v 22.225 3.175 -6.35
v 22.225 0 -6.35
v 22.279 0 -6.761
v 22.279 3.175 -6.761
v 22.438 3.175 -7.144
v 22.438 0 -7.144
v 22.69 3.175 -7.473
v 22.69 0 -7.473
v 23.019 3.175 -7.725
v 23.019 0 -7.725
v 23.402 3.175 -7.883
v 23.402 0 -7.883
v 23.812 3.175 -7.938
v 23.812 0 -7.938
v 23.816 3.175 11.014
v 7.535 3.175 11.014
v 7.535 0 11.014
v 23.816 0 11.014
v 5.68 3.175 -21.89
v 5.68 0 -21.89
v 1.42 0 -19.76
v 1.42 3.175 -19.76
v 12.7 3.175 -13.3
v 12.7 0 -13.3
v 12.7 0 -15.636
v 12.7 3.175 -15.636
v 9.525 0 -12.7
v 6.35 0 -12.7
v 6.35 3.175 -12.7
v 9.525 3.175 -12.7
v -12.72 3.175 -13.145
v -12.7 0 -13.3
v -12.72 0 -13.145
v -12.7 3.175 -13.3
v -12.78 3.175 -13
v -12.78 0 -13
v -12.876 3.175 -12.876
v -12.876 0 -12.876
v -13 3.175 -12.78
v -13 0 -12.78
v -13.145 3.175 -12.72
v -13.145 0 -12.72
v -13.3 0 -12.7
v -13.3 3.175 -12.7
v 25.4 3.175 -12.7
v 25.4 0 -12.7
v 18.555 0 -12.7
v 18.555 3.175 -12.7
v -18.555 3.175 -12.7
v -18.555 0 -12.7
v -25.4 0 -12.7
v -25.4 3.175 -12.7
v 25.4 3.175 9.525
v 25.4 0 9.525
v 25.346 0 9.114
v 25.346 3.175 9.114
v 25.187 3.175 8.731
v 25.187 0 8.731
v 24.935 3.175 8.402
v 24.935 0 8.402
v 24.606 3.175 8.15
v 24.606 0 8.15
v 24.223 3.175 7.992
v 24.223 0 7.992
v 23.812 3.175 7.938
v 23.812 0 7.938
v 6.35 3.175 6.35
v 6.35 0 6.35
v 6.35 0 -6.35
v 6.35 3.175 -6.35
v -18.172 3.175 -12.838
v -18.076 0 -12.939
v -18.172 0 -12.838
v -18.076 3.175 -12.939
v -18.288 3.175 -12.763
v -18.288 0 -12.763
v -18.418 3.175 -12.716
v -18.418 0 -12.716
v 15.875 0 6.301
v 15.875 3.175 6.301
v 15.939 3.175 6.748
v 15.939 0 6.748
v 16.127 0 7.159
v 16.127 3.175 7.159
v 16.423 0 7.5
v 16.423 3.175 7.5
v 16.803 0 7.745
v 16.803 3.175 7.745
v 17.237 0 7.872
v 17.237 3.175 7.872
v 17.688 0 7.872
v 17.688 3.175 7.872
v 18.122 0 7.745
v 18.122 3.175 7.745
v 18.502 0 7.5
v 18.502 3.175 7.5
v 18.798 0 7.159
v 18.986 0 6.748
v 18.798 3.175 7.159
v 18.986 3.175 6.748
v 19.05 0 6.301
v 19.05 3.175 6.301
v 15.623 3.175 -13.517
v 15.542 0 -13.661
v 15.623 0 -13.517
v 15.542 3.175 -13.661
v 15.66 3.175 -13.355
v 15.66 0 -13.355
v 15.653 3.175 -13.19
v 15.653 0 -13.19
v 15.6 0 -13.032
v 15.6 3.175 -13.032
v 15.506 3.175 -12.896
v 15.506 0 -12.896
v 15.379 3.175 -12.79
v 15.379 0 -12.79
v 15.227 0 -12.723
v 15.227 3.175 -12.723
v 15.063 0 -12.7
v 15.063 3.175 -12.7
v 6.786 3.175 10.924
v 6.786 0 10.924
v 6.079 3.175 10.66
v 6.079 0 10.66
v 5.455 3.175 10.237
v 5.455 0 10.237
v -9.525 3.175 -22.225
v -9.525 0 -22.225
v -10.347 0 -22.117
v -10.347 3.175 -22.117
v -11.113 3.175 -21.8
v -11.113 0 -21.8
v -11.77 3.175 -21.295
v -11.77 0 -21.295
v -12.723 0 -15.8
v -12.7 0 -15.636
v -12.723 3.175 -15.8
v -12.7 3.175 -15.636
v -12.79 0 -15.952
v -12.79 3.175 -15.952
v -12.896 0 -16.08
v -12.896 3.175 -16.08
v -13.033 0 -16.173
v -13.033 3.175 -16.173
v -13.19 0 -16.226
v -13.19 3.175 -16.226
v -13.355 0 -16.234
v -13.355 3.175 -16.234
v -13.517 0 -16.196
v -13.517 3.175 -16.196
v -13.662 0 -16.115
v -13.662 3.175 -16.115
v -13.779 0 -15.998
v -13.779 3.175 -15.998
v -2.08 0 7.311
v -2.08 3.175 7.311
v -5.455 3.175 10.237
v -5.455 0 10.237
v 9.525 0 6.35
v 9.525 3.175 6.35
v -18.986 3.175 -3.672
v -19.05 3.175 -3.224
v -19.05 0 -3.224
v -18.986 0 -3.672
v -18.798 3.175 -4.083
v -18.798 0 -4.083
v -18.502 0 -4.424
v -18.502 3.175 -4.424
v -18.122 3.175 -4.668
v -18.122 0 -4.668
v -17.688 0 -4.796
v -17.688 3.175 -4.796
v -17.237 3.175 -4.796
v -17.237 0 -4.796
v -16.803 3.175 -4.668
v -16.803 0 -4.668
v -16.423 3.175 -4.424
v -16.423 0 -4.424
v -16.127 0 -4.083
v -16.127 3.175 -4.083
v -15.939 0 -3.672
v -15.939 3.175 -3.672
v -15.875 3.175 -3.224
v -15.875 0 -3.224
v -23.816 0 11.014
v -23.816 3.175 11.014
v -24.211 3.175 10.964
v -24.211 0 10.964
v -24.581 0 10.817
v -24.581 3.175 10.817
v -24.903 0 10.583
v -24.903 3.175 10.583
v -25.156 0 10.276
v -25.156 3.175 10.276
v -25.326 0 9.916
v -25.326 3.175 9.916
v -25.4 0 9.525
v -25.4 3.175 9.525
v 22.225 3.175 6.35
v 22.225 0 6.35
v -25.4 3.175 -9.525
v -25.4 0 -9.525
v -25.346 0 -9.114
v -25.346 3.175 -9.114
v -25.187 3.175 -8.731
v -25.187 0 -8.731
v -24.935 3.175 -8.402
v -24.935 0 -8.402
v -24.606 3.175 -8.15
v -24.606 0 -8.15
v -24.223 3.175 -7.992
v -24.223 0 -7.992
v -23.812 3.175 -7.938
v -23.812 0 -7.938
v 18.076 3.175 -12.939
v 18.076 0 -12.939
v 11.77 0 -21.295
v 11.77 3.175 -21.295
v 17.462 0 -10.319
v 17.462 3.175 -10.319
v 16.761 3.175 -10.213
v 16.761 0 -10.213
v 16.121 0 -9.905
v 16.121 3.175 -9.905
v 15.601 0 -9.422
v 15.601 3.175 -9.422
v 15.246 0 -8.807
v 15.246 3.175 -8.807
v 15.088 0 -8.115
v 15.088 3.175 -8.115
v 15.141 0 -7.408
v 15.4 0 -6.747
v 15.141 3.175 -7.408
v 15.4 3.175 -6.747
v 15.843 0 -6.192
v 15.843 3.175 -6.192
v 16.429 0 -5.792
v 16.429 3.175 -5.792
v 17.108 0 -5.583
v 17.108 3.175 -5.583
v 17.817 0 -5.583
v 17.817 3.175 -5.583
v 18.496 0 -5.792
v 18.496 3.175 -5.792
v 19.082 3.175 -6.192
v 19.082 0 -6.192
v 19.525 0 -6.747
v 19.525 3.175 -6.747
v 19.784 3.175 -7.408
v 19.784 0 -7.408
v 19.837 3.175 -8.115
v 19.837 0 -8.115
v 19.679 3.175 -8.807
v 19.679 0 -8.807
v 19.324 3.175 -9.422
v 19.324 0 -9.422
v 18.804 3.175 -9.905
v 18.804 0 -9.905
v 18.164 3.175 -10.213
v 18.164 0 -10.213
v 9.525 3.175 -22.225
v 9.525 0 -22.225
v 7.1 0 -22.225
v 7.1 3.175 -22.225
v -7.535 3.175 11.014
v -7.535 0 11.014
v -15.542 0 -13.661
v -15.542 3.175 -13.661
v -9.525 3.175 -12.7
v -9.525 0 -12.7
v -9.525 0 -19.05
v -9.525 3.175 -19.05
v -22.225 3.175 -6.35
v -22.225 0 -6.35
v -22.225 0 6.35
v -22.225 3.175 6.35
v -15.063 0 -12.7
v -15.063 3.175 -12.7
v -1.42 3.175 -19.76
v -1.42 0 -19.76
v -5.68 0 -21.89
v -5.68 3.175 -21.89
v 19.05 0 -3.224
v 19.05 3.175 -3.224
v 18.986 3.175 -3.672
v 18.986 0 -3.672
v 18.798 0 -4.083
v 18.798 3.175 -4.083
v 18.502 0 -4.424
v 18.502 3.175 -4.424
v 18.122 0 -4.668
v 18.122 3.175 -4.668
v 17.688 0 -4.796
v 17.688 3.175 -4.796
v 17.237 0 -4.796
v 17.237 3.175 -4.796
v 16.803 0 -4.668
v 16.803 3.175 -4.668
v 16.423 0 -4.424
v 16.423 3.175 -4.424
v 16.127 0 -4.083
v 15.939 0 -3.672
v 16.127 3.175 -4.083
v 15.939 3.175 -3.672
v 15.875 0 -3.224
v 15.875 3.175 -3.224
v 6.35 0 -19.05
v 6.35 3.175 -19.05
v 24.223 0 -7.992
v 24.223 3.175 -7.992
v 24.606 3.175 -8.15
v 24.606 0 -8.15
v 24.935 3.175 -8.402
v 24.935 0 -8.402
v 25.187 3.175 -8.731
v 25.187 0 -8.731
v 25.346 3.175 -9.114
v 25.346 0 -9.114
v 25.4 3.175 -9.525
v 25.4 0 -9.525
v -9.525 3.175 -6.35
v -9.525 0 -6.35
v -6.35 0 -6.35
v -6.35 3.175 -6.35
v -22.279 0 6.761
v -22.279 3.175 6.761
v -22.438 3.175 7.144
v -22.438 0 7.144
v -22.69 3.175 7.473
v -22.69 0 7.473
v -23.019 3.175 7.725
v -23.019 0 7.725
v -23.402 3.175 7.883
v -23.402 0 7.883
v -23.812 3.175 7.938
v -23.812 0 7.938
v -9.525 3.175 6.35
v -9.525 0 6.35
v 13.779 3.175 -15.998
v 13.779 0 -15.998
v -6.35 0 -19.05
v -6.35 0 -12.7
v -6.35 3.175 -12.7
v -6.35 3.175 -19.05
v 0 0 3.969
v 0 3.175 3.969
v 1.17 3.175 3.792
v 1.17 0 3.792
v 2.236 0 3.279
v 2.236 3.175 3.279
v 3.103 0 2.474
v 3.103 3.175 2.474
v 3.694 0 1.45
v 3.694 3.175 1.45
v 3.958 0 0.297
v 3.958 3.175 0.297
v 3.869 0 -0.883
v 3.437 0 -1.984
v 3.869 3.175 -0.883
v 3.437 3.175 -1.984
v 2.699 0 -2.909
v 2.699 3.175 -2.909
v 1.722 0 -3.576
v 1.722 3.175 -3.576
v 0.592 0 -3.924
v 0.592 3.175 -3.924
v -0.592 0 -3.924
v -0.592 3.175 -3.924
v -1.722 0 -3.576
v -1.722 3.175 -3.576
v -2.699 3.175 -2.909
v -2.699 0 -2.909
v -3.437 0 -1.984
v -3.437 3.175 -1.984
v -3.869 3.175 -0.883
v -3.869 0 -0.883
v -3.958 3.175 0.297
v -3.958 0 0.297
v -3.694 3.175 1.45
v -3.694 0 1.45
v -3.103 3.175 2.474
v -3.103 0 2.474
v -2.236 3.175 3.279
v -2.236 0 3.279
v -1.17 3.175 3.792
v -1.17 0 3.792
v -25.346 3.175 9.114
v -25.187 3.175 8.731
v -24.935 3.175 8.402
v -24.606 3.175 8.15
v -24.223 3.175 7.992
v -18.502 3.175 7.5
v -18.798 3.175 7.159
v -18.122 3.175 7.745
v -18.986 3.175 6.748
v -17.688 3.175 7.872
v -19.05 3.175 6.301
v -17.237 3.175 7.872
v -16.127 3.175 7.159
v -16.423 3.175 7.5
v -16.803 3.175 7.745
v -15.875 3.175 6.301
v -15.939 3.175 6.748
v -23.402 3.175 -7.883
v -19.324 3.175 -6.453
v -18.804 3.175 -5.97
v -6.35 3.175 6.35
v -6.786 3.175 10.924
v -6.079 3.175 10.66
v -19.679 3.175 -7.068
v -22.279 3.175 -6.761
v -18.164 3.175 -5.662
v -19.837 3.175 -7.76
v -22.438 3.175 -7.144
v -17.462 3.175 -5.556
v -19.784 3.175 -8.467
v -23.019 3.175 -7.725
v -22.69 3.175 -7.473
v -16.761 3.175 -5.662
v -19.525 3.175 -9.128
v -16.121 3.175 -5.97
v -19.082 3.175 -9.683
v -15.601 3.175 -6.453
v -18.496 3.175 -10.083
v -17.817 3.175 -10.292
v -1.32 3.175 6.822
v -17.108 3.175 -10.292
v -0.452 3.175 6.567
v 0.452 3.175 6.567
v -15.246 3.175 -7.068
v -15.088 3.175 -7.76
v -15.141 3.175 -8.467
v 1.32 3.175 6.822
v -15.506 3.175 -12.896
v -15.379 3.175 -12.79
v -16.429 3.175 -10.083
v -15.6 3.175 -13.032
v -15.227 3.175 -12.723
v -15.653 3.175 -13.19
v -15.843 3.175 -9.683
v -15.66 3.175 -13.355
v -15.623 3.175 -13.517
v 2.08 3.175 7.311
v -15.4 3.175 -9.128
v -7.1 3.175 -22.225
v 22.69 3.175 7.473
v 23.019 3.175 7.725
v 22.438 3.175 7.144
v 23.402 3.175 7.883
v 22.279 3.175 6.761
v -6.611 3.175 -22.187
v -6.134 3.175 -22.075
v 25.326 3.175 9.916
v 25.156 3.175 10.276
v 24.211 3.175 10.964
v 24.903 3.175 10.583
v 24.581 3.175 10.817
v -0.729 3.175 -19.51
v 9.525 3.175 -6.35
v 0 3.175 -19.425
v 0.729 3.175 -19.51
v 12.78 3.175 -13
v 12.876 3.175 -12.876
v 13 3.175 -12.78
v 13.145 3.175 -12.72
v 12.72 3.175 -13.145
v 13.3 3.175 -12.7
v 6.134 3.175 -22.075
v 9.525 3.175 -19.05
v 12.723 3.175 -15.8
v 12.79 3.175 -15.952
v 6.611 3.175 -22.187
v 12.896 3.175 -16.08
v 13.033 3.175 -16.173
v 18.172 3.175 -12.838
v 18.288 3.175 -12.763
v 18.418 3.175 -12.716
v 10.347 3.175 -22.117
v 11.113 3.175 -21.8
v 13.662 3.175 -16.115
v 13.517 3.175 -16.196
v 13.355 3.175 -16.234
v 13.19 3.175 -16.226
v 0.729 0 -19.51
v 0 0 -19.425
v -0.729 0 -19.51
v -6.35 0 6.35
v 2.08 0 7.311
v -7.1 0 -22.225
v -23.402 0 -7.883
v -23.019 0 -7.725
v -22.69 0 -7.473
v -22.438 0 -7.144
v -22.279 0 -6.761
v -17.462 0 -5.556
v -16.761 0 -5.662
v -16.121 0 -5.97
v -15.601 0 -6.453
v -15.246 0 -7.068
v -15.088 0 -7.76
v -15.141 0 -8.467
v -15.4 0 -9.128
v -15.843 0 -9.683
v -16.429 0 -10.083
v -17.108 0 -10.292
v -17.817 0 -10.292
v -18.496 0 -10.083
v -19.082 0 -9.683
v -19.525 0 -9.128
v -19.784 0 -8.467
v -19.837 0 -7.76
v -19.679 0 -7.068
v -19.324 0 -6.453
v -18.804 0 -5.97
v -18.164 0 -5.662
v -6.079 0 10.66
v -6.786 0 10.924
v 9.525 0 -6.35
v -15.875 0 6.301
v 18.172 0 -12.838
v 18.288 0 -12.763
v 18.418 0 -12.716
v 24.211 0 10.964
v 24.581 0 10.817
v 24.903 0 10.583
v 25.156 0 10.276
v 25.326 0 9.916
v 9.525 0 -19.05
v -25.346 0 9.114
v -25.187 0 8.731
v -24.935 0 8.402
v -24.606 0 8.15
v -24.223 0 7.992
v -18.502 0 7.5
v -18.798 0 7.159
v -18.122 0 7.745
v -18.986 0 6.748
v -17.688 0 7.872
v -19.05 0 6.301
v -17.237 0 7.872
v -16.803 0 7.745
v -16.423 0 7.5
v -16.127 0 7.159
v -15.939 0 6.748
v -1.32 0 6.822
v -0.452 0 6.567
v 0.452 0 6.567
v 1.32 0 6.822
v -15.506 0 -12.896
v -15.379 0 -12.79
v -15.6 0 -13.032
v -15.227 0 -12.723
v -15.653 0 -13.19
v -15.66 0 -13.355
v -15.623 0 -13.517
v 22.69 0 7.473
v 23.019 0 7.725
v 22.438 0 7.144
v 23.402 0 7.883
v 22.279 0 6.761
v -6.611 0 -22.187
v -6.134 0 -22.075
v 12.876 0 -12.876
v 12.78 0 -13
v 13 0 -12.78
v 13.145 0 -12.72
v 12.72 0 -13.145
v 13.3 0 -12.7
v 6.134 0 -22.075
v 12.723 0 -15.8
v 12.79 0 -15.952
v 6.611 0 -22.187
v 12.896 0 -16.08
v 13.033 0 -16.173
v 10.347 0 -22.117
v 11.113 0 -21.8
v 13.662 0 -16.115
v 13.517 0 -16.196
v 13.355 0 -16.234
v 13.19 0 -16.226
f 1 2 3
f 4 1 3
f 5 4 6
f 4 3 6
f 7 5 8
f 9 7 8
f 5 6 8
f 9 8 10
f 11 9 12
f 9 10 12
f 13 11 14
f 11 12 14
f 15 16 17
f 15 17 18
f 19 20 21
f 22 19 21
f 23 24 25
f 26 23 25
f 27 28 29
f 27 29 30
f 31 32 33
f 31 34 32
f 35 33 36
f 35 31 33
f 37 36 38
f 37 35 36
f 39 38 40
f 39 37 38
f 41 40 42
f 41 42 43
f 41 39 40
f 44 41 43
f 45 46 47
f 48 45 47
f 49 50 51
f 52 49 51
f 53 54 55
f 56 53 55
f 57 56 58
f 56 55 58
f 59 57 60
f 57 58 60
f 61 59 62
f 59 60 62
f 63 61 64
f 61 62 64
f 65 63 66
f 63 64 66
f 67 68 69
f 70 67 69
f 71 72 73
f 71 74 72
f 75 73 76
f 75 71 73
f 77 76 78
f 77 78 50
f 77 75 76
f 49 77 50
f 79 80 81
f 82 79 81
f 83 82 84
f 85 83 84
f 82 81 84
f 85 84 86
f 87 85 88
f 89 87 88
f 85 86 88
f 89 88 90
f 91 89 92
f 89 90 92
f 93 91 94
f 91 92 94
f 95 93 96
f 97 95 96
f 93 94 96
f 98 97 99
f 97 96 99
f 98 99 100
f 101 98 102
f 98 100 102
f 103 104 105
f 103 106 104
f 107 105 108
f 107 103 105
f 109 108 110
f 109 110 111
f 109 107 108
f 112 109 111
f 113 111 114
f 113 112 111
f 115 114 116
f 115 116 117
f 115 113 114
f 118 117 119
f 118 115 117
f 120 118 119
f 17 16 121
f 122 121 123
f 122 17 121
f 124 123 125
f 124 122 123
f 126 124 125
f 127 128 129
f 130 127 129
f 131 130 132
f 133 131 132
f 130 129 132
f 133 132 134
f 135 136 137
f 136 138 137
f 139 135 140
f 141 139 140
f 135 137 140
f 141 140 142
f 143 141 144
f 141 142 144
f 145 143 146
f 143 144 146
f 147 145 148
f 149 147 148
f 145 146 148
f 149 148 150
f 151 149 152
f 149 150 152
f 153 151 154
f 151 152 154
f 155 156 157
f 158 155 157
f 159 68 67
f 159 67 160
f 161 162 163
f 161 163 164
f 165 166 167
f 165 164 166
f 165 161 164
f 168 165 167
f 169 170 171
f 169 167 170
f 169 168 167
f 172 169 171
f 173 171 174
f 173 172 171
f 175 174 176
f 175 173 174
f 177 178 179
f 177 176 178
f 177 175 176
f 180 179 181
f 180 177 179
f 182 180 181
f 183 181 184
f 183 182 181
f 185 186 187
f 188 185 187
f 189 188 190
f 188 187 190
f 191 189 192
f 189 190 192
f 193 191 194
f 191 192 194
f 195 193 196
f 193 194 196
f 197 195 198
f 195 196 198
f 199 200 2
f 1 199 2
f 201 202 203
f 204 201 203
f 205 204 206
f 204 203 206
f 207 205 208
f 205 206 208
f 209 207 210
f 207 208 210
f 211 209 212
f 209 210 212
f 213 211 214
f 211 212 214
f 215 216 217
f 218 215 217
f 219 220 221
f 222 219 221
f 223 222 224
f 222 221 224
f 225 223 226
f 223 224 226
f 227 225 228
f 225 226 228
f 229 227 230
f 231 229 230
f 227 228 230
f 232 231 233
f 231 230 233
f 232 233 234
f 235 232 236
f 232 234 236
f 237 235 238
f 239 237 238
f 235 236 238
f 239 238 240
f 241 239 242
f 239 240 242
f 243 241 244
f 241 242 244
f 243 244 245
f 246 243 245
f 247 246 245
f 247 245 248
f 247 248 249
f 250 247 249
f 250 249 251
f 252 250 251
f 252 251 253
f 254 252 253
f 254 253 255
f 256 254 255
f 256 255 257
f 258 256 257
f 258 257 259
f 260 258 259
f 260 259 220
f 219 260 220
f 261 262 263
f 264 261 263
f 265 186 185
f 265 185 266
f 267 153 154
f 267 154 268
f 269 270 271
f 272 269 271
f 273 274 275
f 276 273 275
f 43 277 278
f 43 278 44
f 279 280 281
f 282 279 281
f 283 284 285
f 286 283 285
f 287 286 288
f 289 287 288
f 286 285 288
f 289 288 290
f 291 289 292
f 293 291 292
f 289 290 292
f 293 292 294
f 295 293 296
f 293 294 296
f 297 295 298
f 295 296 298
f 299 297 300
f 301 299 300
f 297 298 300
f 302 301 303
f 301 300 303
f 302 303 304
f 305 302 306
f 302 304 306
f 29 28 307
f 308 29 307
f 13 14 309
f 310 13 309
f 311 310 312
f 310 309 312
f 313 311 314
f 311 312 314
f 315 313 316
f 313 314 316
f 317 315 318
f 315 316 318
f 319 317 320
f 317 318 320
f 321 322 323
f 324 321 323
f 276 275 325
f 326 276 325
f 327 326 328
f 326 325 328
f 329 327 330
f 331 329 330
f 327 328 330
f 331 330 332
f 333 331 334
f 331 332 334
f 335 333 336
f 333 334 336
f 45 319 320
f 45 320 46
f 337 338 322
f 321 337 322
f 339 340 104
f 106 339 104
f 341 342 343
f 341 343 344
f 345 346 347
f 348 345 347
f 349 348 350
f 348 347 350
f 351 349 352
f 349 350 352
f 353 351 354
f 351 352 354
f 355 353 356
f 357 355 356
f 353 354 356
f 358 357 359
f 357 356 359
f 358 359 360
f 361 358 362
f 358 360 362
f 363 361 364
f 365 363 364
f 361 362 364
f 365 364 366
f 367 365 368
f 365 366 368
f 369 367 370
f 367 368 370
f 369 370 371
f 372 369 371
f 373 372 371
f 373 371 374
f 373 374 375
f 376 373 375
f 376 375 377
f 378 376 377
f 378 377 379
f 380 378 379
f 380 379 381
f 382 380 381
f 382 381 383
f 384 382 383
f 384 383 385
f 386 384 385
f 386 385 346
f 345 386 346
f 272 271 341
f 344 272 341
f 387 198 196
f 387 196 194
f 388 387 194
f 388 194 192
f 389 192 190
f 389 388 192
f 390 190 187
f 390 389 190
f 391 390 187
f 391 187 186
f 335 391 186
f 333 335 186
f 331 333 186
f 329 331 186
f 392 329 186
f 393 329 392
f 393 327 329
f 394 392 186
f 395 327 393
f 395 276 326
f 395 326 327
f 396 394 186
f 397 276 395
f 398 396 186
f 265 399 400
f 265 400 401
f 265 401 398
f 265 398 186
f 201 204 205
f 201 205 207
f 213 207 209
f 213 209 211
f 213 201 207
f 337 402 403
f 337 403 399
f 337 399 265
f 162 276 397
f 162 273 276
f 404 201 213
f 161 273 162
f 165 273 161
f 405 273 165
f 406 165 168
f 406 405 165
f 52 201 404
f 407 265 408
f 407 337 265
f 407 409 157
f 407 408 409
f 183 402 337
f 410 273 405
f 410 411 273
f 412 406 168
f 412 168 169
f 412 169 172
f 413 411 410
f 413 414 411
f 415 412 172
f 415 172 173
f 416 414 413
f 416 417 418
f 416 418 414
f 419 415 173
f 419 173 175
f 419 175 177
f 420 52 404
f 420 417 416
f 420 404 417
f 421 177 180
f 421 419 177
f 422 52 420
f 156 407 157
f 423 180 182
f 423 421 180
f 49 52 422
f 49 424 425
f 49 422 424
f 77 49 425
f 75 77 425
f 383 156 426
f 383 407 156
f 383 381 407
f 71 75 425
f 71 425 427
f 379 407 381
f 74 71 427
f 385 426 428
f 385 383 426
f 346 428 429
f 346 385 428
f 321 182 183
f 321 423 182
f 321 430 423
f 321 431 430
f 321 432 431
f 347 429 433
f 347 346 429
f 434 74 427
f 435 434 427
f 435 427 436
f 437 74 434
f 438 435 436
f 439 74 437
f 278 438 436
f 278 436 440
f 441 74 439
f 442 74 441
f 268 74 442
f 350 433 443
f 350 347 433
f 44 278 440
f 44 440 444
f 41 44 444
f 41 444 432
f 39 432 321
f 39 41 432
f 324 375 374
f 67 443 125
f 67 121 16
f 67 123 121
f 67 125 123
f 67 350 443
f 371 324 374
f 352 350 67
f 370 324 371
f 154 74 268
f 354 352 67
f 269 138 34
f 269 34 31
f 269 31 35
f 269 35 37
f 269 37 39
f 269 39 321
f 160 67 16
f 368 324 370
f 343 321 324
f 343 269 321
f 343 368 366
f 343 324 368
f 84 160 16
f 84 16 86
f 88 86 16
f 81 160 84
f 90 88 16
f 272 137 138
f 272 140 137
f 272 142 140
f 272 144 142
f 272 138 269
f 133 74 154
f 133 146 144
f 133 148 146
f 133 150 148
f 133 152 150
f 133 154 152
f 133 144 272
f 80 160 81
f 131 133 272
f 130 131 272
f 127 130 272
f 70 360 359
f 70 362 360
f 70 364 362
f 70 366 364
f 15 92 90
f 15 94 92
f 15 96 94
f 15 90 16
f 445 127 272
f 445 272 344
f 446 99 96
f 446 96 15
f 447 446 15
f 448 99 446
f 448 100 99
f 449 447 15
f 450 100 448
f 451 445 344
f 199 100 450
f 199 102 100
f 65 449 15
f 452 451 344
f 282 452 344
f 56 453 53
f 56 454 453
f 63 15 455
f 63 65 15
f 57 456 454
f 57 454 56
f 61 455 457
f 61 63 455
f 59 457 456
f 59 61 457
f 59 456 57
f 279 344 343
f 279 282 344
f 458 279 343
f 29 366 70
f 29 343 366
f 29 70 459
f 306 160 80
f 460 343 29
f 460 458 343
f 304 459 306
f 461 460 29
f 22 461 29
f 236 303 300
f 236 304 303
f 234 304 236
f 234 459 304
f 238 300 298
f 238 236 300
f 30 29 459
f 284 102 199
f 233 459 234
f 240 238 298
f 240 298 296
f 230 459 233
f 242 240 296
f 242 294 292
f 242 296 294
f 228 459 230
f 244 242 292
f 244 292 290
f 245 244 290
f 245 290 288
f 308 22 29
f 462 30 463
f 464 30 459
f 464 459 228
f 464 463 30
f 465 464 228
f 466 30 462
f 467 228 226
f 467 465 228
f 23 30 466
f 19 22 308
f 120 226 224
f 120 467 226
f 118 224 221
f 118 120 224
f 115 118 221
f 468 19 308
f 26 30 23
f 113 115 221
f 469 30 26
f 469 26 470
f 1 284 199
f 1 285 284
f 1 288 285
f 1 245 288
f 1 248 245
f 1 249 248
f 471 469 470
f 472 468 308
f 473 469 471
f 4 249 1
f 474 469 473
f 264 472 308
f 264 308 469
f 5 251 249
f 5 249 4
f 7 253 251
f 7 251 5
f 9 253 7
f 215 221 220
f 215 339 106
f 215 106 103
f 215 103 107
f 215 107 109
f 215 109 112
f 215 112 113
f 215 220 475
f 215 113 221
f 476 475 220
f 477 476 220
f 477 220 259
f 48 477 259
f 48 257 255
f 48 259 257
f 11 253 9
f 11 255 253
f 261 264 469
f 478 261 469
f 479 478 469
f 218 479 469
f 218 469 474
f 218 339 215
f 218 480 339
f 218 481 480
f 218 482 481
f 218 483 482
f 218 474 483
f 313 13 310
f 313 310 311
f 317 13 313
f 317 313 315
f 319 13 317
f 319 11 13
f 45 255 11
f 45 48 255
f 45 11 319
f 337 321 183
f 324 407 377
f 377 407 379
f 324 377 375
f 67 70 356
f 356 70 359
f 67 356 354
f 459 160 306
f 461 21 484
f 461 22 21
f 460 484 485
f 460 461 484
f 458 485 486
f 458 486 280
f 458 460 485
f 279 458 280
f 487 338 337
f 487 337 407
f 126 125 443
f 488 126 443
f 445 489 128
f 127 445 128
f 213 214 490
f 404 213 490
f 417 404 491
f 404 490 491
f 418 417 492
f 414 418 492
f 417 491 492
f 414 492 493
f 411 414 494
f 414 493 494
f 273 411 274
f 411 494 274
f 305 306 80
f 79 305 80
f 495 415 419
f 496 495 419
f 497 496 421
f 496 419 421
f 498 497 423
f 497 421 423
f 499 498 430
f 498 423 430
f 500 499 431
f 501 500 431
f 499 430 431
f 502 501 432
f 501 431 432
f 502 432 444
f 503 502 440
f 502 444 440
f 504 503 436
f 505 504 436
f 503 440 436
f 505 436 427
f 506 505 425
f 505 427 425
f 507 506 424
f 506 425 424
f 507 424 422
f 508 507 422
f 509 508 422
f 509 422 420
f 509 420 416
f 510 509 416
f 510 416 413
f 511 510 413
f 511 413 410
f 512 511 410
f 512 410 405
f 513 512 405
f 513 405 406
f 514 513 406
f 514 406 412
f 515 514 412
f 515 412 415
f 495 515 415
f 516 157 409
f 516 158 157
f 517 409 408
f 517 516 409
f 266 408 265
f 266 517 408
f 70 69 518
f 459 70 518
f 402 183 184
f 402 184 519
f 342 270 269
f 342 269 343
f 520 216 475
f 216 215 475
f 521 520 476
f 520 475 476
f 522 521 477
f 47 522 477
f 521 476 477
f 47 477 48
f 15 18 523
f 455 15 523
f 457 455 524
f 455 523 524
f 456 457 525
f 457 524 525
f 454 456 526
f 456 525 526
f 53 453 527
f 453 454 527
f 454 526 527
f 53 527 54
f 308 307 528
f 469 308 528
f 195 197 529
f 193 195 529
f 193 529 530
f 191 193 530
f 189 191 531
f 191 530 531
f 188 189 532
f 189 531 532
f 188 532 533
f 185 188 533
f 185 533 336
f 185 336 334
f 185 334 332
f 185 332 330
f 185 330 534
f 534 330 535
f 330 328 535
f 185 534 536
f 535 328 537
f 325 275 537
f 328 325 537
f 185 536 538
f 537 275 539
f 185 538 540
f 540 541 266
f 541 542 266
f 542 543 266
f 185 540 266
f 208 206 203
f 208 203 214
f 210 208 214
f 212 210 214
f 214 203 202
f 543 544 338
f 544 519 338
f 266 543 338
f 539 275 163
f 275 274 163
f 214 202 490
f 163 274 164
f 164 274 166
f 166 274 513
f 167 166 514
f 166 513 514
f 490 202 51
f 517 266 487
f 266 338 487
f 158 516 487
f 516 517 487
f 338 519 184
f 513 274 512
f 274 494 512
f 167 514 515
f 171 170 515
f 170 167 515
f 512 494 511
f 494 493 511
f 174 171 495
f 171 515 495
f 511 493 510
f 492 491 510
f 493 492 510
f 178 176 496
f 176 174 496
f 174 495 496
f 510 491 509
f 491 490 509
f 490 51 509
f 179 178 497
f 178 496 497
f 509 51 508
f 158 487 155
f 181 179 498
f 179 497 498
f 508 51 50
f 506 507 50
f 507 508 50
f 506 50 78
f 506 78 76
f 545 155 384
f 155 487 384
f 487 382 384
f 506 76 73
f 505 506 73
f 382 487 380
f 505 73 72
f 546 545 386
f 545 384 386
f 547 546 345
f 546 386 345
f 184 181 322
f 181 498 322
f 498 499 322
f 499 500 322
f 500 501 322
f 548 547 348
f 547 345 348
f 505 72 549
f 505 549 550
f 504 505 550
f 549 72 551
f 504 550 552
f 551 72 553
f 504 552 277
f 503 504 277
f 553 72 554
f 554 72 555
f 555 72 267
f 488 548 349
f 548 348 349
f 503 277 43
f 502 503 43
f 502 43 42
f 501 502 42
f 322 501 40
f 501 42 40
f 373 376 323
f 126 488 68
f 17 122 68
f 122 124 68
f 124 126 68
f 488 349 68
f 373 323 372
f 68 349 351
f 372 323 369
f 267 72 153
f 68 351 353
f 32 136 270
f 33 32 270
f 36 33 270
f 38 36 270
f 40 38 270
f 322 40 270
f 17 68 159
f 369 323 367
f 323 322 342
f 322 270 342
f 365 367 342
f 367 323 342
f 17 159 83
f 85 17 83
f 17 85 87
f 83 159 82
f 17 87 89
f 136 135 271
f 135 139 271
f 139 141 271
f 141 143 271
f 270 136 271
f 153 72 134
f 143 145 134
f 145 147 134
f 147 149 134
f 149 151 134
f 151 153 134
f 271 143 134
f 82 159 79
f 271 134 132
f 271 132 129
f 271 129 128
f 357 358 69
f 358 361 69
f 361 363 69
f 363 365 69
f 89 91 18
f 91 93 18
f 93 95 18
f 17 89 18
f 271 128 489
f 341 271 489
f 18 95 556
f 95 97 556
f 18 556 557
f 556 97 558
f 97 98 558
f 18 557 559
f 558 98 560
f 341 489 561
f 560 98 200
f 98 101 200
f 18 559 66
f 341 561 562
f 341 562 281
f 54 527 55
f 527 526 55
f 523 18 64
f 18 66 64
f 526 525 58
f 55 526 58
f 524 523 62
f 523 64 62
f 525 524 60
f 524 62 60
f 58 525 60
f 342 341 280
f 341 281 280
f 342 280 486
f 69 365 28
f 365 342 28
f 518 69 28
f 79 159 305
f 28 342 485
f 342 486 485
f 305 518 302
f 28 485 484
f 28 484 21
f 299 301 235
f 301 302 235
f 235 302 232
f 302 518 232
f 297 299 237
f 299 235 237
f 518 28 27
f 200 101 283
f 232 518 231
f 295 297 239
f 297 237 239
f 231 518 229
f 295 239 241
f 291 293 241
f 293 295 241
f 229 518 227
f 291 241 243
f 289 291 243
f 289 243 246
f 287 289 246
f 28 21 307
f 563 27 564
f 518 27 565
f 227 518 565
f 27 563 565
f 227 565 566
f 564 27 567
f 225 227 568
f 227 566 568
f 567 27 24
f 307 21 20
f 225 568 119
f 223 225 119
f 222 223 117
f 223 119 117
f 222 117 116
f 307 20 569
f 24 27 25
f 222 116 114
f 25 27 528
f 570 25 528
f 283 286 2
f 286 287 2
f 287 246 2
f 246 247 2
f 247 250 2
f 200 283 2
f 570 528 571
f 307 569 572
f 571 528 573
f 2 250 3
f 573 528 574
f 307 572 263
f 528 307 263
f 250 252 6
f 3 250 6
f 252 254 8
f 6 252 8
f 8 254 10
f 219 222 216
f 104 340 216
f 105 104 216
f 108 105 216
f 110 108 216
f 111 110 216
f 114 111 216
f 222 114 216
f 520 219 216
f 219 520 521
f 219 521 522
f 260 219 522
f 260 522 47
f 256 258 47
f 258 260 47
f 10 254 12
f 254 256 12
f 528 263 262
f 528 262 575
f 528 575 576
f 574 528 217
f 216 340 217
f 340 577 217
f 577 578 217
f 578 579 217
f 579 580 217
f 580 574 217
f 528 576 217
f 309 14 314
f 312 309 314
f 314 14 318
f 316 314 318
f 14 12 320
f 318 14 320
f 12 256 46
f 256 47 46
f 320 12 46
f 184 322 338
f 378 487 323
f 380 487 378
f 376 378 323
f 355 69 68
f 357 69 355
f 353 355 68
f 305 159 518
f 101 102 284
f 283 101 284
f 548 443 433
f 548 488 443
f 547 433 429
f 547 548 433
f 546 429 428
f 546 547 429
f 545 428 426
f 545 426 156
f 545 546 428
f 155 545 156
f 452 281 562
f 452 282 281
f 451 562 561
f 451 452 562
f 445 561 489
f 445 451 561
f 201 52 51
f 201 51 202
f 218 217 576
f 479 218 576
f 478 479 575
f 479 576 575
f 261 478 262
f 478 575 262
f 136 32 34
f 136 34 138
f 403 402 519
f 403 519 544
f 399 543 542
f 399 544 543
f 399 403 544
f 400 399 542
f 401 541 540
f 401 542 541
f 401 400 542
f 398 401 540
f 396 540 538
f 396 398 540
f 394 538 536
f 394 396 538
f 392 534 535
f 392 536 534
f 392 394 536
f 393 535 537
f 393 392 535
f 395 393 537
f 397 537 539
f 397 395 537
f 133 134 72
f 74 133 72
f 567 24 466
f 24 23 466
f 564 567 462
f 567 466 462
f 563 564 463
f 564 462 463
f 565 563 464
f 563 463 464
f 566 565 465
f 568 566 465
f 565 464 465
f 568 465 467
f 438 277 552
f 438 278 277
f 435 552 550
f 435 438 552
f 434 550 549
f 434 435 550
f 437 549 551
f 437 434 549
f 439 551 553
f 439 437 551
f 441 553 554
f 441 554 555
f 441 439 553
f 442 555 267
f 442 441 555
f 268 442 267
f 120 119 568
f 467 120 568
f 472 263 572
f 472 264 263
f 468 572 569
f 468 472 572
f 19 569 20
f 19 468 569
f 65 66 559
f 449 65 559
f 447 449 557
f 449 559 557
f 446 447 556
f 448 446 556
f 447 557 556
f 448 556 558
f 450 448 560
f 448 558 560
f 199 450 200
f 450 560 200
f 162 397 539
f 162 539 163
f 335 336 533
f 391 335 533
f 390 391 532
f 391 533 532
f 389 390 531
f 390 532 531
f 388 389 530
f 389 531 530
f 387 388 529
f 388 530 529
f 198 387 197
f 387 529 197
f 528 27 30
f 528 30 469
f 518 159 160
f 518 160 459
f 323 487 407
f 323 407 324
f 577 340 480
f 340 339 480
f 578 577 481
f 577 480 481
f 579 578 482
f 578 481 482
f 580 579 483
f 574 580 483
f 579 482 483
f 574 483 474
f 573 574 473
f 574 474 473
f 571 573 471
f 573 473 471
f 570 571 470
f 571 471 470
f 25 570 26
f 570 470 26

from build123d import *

# Parameters (mm, degrees)
SKETCH1_R           = 3.175
SKETCH1_W           = 3.175
SKETCH1_H           = 12.7
SKETCH1_H_2         = 6.35
BOSS_EXTRUDE1_DEPTH = 3.175
FILLET1_R           = 1.5875
SKETCH2_R           = 2.38125
CUT_EXTRUDE1_DEPTH  = 46.900442536
FILLET2_R           = 3.175
FILLET4_R           = 0.6
SKETCH3_W           = 59.294957885
SKETCH3_H           = 30.48
CUT_EXTRUDE5_DEPTH  = 46.900442536
FILLET5_R           = 1.5875
CUT_EXTRUDE6_DEPTH  = 34.89972345
SKETCH5_R           = 3.96875
CUT_EXTRUDE7_DEPTH  = 34.89972345
FILLET6_R           = 3.175


with BuildPart() as part:
    # Sketch1 → Boss-Extrude1 (new body)
    with BuildSketch(Plane(origin=(0, 0, 0), x_dir=(1, 0, 0), z_dir=(0, 1, 0))):
        with BuildLine():
            Line((25.4, -12.7), (25.4, -9.525))
            ThreePointArc((25.4, -9.525), (24.935032015, -8.402467985), (23.8125, -7.9375))
            ThreePointArc((23.8125, -7.9375), (22.689967985, -7.472532015), (22.225, -6.35))
            Line((22.225, -6.35), (22.225, 6.35))
            ThreePointArc((22.225, 6.35), (22.689967985, 7.472532015), (23.8125, 7.9375))
            ThreePointArc((23.8125, 7.9375), (24.935032015, 8.402467985), (25.4, 9.525))
            Line((25.4, 9.525), (25.4, 12.7))
            Line((25.4, 12.7), (23.8125, 12.7))
            Line((23.8125, 12.7), (18.25625, 12.7))
            Line((18.25625, 12.7), (11.77006403, 21.29506403))
            ThreePointArc((11.77006403, 21.29506403), (10.740019898, 21.983317516), (9.525, 22.225))
            Line((9.525, 22.225), (6.35, 22.225))
            Line((6.35, 22.225), (0, 19.05))
            Line((0, 19.05), (-6.35, 22.225))
            Line((-6.35, 22.225), (-9.525, 22.225))
            ThreePointArc((-9.525, 22.225), (-10.740019898, 21.983317516), (-11.77006403, 21.29506403))
            Line((-11.77006403, 21.29506403), (-18.25625, 12.7))
            Line((-18.25625, 12.7), (-23.8125, 12.7))
            Line((-23.8125, 12.7), (-25.4, 12.7))
            Line((-25.4, 12.7), (-25.4, 9.525))
            ThreePointArc((-25.4, 9.525), (-24.935032015, 8.402467985), (-23.8125, 7.9375))
            ThreePointArc((-23.8125, 7.9375), (-22.689967985, 7.472532015), (-22.225, 6.35))
            Line((-22.225, 6.35), (-22.225, -6.35))
            ThreePointArc((-22.225, -6.35), (-22.689967985, -7.472532015), (-23.8125, -7.9375))
            ThreePointArc((-23.8125, -7.9375), (-24.935032015, -8.402467985), (-25.4, -9.525))
            Line((-25.4, -9.525), (-25.4, -12.7))
            Line((-25.4, -12.7), (-25.4, -31.75))
            ThreePointArc((-25.4, -31.75), (-20.422679281, -37.949858998), (-13.293464066, -34.430446612))
            Line((-13.293464066, -34.430446612), (-3.175, -12.7))
            Line((-3.175, -12.7), (3.175, -12.7))
            Line((3.175, -12.7), (13.293464066, -34.430446612))
            ThreePointArc((13.293464066, -34.430446612), (20.422679281, -37.949858998), (25.4, -31.75))
            Line((25.4, -31.75), (25.4, -12.7))
        make_face()
        with Locations(Location((-19.05, -31.75, 0), (0, 0, 270))):
            Circle(SKETCH1_R, mode=Mode.SUBTRACT)
        with Locations(Location((19.05, -31.75, 0), (0, 0, 270))):
            Circle(SKETCH1_R, mode=Mode.SUBTRACT)
        with Locations((-7.9375, 0)):
            Rectangle(SKETCH1_W, SKETCH1_H, mode=Mode.SUBTRACT)
        with BuildLine():
            Line((-19.05, -12.7), (-19.05, -22.225))
            ThreePointArc((-19.05, -22.225), (-16.990981078, -22.450211503), (-15.029330082, -23.115196099))
            Line((-15.029330082, -23.115196099), (-10.179646624, -12.7))
            Line((-10.179646624, -12.7), (-19.05, -12.7))
        make_face(mode=Mode.SUBTRACT)
        with BuildLine():
            Line((10.179646624, -12.7), (19.05, -12.7))
            Line((19.05, -12.7), (19.05, -22.225))
            ThreePointArc((19.05, -22.225), (16.990981078, -22.450211503), (15.029330082, -23.115196099))
            Line((15.029330082, -23.115196099), (10.179646624, -12.7))
        make_face(mode=Mode.SUBTRACT)
        with Locations((7.9375, 0)):
            Rectangle(SKETCH1_W, SKETCH1_H, mode=Mode.SUBTRACT)
        with Locations((-7.9375, 15.875)):
            Rectangle(SKETCH1_W, SKETCH1_H_2, mode=Mode.SUBTRACT)
        Polygon((16.267445908, 12.7), (12.7, 12.7), (12.7, 17.427343025), align=None, mode=Mode.SUBTRACT)
        with Locations((7.9375, 15.875)):
            Rectangle(SKETCH1_W, SKETCH1_H_2, mode=Mode.SUBTRACT)
        Polygon((-12.7, 12.7), (-12.7, 17.427343025), (-16.267445908, 12.7), align=None, mode=Mode.SUBTRACT)
    extrude(amount=BOSS_EXTRUDE1_DEPTH)

    # Fillet1
    fillet1_edges = [part.edges().sort_by_distance(p)[0] for p in [
        (3.175, 1.5875, 12.7),
        (-3.175, 1.5875, 12.7),
        (-10.179646624, 1.5875, 12.7),
        (-19.05, 1.5875, 12.7),
        (19.05, 1.5875, 12.7),
        (10.179646624, 1.5875, 12.7),
    ]]
    fillet(fillet1_edges, radius=FILLET1_R)

    # Sketch2 → Cut-Extrude1 (cut, through all)
    with BuildSketch(Plane(origin=(0, 3.175, 0), x_dir=(1, 0, 0), z_dir=(0, 1, 0))):
        with Locations(Location((-17.4625, 7.9375, 0), (0, 0, 270))):
            Circle(SKETCH2_R)
        with Locations(Location((17.4625, 7.9375, 0), (0, 0, 90))):
            Circle(SKETCH2_R)
    extrude(amount=-CUT_EXTRUDE1_DEPTH, mode=Mode.SUBTRACT)

    # Fillet2
    fillet2_edges = [part.edges().sort_by_distance(p)[0] for p in [
        (-6.35, 1.5875, -22.225),
        (0, 1.5875, -19.05),
        (6.35, 1.5875, -22.225),
    ]]
    fillet(fillet2_edges, radius=FILLET2_R)

    # Fillet4
    fillet4_edges = [part.edges().sort_by_distance(p)[0] for p in [
        (18.25625, 1.5875, -12.7),
        (-18.25625, 1.5875, -12.7),
        (16.267445908, 1.5875, -12.7),
        (12.7, 1.5875, -17.427343025),
        (12.7, 1.5875, -12.7),
        (-12.7, 1.5875, -12.7),
        (-12.7, 1.5875, -17.427343025),
        (-16.267445908, 1.5875, -12.7),
    ]]
    fillet(fillet4_edges, radius=FILLET4_R)

    # Sketch3 → Cut-Extrude5 (cut, through all)
    with BuildSketch(Plane(origin=(0, 3.175, 0), x_dir=(1, 0, 0), z_dir=(0, 1, 0))):
        with Locations((-1.965596619, -26.253733592)):
            Rectangle(SKETCH3_W, SKETCH3_H)
    extrude(amount=-CUT_EXTRUDE5_DEPTH, mode=Mode.SUBTRACT)

    # Fillet5
    # the kernel refuses this fillet: 1.5875 mm, written as the material it takes off along each edge
    with BuildSketch(Plane(origin=(25.4, -3.961061605, 11.013733592), x_dir=(0, 0, -1), z_dir=(0, 1, 0))) as fillet5_piece_1:
        with BuildLine():
            CenterArc((1.5875, 1.584424642), FILLET5_R, 180, 86.433035976)
            Line((0, 1.584424642), (-0.03175, 1.584424642))
            Line((-0.03175, 1.584424642), (-0.03175, 0))
            Line((-0.03175, 0), (0, -0.03175))
            ThreePointArc((0, -0.03175), (0.744366796, -0.03175), (1.486758264, -0.031688493))
            Line((1.486758264, -0.031688493), (1.488733592, 0))
        make_face()
    extrude(amount=11.097123211, mode=Mode.SUBTRACT)
    with BuildSketch(Plane(origin=(-25.4, 7.136061605, 11.013733592), x_dir=(1, 0, 0), z_dir=(0, -1, 0))) as fillet5_piece_2:
        with BuildLine():
            CenterArc((1.584424642, -1.5875), FILLET5_R, 90, 86.433035976)
            Line((0, -1.488733592), (-0.031688493, -1.486758264))
            ThreePointArc((-0.031688493, -1.486758264), (-0.03175, -0.744366796), (-0.03175, 0))
            Line((-0.03175, 0), (0, 0.03175))
            Line((0, 0.03175), (1.584424642, 0.03175))
            Line((1.584424642, 0.03175), (1.584424642, 0))
        make_face()
    extrude(amount=11.097123211, mode=Mode.SUBTRACT)

    # Sketch4 → Cut-Extrude6 (cut, through all)
    with BuildSketch(Plane(origin=(0, 3.175, 0), x_dir=(1, 0, 0), z_dir=(0, 1, 0))):
        with BuildLine():
            Line((-15.875, 3.224383204), (-15.875, -6.300616796))
            ThreePointArc((-15.875, -6.300616796), (-17.4625, -7.888116796), (-19.05, -6.300616796))
            Line((-19.05, -6.300616796), (-19.05, 3.224383204))
            ThreePointArc((-19.05, 3.224383204), (-17.4625, 4.811883204), (-15.875, 3.224383204))
        make_face()
        with BuildLine():
            Line((15.875, 3.224383204), (15.875, -6.300616796))
            ThreePointArc((15.875, -6.300616796), (17.4625, -7.888116796), (19.05, -6.300616796))
            Line((19.05, -6.300616796), (19.05, 3.224383204))
            ThreePointArc((19.05, 3.224383204), (17.4625, 4.811883204), (15.875, 3.224383204))
        make_face()
    extrude(amount=-CUT_EXTRUDE6_DEPTH, mode=Mode.SUBTRACT)

    # Sketch5 → Cut-Extrude7 (cut, through all)
    with BuildSketch(Plane(origin=(0, 3.175, 0), x_dir=(1, 0, 0), z_dir=(0, 1, 0))):
        with Locations(Location((0, 0, 0), (0, 0, 270))):
            Circle(SKETCH5_R)
        Polygon((0, -5.506866796), (-6.35, -11.013733592), (6.35, -11.013733592), align=None)
    extrude(amount=-CUT_EXTRUDE7_DEPTH, mode=Mode.SUBTRACT)

    # Fillet6
    fillet6_edges = [part.edges().sort_by_distance(p)[0] for p in [
        (0, 1.5875, 5.506866796),
        (6.35, 1.5875, 11.013733592),
        (-6.35, 1.5875, 11.013733592),
    ]]
    fillet(fillet6_edges, radius=FILLET6_R)


solid = part.part
